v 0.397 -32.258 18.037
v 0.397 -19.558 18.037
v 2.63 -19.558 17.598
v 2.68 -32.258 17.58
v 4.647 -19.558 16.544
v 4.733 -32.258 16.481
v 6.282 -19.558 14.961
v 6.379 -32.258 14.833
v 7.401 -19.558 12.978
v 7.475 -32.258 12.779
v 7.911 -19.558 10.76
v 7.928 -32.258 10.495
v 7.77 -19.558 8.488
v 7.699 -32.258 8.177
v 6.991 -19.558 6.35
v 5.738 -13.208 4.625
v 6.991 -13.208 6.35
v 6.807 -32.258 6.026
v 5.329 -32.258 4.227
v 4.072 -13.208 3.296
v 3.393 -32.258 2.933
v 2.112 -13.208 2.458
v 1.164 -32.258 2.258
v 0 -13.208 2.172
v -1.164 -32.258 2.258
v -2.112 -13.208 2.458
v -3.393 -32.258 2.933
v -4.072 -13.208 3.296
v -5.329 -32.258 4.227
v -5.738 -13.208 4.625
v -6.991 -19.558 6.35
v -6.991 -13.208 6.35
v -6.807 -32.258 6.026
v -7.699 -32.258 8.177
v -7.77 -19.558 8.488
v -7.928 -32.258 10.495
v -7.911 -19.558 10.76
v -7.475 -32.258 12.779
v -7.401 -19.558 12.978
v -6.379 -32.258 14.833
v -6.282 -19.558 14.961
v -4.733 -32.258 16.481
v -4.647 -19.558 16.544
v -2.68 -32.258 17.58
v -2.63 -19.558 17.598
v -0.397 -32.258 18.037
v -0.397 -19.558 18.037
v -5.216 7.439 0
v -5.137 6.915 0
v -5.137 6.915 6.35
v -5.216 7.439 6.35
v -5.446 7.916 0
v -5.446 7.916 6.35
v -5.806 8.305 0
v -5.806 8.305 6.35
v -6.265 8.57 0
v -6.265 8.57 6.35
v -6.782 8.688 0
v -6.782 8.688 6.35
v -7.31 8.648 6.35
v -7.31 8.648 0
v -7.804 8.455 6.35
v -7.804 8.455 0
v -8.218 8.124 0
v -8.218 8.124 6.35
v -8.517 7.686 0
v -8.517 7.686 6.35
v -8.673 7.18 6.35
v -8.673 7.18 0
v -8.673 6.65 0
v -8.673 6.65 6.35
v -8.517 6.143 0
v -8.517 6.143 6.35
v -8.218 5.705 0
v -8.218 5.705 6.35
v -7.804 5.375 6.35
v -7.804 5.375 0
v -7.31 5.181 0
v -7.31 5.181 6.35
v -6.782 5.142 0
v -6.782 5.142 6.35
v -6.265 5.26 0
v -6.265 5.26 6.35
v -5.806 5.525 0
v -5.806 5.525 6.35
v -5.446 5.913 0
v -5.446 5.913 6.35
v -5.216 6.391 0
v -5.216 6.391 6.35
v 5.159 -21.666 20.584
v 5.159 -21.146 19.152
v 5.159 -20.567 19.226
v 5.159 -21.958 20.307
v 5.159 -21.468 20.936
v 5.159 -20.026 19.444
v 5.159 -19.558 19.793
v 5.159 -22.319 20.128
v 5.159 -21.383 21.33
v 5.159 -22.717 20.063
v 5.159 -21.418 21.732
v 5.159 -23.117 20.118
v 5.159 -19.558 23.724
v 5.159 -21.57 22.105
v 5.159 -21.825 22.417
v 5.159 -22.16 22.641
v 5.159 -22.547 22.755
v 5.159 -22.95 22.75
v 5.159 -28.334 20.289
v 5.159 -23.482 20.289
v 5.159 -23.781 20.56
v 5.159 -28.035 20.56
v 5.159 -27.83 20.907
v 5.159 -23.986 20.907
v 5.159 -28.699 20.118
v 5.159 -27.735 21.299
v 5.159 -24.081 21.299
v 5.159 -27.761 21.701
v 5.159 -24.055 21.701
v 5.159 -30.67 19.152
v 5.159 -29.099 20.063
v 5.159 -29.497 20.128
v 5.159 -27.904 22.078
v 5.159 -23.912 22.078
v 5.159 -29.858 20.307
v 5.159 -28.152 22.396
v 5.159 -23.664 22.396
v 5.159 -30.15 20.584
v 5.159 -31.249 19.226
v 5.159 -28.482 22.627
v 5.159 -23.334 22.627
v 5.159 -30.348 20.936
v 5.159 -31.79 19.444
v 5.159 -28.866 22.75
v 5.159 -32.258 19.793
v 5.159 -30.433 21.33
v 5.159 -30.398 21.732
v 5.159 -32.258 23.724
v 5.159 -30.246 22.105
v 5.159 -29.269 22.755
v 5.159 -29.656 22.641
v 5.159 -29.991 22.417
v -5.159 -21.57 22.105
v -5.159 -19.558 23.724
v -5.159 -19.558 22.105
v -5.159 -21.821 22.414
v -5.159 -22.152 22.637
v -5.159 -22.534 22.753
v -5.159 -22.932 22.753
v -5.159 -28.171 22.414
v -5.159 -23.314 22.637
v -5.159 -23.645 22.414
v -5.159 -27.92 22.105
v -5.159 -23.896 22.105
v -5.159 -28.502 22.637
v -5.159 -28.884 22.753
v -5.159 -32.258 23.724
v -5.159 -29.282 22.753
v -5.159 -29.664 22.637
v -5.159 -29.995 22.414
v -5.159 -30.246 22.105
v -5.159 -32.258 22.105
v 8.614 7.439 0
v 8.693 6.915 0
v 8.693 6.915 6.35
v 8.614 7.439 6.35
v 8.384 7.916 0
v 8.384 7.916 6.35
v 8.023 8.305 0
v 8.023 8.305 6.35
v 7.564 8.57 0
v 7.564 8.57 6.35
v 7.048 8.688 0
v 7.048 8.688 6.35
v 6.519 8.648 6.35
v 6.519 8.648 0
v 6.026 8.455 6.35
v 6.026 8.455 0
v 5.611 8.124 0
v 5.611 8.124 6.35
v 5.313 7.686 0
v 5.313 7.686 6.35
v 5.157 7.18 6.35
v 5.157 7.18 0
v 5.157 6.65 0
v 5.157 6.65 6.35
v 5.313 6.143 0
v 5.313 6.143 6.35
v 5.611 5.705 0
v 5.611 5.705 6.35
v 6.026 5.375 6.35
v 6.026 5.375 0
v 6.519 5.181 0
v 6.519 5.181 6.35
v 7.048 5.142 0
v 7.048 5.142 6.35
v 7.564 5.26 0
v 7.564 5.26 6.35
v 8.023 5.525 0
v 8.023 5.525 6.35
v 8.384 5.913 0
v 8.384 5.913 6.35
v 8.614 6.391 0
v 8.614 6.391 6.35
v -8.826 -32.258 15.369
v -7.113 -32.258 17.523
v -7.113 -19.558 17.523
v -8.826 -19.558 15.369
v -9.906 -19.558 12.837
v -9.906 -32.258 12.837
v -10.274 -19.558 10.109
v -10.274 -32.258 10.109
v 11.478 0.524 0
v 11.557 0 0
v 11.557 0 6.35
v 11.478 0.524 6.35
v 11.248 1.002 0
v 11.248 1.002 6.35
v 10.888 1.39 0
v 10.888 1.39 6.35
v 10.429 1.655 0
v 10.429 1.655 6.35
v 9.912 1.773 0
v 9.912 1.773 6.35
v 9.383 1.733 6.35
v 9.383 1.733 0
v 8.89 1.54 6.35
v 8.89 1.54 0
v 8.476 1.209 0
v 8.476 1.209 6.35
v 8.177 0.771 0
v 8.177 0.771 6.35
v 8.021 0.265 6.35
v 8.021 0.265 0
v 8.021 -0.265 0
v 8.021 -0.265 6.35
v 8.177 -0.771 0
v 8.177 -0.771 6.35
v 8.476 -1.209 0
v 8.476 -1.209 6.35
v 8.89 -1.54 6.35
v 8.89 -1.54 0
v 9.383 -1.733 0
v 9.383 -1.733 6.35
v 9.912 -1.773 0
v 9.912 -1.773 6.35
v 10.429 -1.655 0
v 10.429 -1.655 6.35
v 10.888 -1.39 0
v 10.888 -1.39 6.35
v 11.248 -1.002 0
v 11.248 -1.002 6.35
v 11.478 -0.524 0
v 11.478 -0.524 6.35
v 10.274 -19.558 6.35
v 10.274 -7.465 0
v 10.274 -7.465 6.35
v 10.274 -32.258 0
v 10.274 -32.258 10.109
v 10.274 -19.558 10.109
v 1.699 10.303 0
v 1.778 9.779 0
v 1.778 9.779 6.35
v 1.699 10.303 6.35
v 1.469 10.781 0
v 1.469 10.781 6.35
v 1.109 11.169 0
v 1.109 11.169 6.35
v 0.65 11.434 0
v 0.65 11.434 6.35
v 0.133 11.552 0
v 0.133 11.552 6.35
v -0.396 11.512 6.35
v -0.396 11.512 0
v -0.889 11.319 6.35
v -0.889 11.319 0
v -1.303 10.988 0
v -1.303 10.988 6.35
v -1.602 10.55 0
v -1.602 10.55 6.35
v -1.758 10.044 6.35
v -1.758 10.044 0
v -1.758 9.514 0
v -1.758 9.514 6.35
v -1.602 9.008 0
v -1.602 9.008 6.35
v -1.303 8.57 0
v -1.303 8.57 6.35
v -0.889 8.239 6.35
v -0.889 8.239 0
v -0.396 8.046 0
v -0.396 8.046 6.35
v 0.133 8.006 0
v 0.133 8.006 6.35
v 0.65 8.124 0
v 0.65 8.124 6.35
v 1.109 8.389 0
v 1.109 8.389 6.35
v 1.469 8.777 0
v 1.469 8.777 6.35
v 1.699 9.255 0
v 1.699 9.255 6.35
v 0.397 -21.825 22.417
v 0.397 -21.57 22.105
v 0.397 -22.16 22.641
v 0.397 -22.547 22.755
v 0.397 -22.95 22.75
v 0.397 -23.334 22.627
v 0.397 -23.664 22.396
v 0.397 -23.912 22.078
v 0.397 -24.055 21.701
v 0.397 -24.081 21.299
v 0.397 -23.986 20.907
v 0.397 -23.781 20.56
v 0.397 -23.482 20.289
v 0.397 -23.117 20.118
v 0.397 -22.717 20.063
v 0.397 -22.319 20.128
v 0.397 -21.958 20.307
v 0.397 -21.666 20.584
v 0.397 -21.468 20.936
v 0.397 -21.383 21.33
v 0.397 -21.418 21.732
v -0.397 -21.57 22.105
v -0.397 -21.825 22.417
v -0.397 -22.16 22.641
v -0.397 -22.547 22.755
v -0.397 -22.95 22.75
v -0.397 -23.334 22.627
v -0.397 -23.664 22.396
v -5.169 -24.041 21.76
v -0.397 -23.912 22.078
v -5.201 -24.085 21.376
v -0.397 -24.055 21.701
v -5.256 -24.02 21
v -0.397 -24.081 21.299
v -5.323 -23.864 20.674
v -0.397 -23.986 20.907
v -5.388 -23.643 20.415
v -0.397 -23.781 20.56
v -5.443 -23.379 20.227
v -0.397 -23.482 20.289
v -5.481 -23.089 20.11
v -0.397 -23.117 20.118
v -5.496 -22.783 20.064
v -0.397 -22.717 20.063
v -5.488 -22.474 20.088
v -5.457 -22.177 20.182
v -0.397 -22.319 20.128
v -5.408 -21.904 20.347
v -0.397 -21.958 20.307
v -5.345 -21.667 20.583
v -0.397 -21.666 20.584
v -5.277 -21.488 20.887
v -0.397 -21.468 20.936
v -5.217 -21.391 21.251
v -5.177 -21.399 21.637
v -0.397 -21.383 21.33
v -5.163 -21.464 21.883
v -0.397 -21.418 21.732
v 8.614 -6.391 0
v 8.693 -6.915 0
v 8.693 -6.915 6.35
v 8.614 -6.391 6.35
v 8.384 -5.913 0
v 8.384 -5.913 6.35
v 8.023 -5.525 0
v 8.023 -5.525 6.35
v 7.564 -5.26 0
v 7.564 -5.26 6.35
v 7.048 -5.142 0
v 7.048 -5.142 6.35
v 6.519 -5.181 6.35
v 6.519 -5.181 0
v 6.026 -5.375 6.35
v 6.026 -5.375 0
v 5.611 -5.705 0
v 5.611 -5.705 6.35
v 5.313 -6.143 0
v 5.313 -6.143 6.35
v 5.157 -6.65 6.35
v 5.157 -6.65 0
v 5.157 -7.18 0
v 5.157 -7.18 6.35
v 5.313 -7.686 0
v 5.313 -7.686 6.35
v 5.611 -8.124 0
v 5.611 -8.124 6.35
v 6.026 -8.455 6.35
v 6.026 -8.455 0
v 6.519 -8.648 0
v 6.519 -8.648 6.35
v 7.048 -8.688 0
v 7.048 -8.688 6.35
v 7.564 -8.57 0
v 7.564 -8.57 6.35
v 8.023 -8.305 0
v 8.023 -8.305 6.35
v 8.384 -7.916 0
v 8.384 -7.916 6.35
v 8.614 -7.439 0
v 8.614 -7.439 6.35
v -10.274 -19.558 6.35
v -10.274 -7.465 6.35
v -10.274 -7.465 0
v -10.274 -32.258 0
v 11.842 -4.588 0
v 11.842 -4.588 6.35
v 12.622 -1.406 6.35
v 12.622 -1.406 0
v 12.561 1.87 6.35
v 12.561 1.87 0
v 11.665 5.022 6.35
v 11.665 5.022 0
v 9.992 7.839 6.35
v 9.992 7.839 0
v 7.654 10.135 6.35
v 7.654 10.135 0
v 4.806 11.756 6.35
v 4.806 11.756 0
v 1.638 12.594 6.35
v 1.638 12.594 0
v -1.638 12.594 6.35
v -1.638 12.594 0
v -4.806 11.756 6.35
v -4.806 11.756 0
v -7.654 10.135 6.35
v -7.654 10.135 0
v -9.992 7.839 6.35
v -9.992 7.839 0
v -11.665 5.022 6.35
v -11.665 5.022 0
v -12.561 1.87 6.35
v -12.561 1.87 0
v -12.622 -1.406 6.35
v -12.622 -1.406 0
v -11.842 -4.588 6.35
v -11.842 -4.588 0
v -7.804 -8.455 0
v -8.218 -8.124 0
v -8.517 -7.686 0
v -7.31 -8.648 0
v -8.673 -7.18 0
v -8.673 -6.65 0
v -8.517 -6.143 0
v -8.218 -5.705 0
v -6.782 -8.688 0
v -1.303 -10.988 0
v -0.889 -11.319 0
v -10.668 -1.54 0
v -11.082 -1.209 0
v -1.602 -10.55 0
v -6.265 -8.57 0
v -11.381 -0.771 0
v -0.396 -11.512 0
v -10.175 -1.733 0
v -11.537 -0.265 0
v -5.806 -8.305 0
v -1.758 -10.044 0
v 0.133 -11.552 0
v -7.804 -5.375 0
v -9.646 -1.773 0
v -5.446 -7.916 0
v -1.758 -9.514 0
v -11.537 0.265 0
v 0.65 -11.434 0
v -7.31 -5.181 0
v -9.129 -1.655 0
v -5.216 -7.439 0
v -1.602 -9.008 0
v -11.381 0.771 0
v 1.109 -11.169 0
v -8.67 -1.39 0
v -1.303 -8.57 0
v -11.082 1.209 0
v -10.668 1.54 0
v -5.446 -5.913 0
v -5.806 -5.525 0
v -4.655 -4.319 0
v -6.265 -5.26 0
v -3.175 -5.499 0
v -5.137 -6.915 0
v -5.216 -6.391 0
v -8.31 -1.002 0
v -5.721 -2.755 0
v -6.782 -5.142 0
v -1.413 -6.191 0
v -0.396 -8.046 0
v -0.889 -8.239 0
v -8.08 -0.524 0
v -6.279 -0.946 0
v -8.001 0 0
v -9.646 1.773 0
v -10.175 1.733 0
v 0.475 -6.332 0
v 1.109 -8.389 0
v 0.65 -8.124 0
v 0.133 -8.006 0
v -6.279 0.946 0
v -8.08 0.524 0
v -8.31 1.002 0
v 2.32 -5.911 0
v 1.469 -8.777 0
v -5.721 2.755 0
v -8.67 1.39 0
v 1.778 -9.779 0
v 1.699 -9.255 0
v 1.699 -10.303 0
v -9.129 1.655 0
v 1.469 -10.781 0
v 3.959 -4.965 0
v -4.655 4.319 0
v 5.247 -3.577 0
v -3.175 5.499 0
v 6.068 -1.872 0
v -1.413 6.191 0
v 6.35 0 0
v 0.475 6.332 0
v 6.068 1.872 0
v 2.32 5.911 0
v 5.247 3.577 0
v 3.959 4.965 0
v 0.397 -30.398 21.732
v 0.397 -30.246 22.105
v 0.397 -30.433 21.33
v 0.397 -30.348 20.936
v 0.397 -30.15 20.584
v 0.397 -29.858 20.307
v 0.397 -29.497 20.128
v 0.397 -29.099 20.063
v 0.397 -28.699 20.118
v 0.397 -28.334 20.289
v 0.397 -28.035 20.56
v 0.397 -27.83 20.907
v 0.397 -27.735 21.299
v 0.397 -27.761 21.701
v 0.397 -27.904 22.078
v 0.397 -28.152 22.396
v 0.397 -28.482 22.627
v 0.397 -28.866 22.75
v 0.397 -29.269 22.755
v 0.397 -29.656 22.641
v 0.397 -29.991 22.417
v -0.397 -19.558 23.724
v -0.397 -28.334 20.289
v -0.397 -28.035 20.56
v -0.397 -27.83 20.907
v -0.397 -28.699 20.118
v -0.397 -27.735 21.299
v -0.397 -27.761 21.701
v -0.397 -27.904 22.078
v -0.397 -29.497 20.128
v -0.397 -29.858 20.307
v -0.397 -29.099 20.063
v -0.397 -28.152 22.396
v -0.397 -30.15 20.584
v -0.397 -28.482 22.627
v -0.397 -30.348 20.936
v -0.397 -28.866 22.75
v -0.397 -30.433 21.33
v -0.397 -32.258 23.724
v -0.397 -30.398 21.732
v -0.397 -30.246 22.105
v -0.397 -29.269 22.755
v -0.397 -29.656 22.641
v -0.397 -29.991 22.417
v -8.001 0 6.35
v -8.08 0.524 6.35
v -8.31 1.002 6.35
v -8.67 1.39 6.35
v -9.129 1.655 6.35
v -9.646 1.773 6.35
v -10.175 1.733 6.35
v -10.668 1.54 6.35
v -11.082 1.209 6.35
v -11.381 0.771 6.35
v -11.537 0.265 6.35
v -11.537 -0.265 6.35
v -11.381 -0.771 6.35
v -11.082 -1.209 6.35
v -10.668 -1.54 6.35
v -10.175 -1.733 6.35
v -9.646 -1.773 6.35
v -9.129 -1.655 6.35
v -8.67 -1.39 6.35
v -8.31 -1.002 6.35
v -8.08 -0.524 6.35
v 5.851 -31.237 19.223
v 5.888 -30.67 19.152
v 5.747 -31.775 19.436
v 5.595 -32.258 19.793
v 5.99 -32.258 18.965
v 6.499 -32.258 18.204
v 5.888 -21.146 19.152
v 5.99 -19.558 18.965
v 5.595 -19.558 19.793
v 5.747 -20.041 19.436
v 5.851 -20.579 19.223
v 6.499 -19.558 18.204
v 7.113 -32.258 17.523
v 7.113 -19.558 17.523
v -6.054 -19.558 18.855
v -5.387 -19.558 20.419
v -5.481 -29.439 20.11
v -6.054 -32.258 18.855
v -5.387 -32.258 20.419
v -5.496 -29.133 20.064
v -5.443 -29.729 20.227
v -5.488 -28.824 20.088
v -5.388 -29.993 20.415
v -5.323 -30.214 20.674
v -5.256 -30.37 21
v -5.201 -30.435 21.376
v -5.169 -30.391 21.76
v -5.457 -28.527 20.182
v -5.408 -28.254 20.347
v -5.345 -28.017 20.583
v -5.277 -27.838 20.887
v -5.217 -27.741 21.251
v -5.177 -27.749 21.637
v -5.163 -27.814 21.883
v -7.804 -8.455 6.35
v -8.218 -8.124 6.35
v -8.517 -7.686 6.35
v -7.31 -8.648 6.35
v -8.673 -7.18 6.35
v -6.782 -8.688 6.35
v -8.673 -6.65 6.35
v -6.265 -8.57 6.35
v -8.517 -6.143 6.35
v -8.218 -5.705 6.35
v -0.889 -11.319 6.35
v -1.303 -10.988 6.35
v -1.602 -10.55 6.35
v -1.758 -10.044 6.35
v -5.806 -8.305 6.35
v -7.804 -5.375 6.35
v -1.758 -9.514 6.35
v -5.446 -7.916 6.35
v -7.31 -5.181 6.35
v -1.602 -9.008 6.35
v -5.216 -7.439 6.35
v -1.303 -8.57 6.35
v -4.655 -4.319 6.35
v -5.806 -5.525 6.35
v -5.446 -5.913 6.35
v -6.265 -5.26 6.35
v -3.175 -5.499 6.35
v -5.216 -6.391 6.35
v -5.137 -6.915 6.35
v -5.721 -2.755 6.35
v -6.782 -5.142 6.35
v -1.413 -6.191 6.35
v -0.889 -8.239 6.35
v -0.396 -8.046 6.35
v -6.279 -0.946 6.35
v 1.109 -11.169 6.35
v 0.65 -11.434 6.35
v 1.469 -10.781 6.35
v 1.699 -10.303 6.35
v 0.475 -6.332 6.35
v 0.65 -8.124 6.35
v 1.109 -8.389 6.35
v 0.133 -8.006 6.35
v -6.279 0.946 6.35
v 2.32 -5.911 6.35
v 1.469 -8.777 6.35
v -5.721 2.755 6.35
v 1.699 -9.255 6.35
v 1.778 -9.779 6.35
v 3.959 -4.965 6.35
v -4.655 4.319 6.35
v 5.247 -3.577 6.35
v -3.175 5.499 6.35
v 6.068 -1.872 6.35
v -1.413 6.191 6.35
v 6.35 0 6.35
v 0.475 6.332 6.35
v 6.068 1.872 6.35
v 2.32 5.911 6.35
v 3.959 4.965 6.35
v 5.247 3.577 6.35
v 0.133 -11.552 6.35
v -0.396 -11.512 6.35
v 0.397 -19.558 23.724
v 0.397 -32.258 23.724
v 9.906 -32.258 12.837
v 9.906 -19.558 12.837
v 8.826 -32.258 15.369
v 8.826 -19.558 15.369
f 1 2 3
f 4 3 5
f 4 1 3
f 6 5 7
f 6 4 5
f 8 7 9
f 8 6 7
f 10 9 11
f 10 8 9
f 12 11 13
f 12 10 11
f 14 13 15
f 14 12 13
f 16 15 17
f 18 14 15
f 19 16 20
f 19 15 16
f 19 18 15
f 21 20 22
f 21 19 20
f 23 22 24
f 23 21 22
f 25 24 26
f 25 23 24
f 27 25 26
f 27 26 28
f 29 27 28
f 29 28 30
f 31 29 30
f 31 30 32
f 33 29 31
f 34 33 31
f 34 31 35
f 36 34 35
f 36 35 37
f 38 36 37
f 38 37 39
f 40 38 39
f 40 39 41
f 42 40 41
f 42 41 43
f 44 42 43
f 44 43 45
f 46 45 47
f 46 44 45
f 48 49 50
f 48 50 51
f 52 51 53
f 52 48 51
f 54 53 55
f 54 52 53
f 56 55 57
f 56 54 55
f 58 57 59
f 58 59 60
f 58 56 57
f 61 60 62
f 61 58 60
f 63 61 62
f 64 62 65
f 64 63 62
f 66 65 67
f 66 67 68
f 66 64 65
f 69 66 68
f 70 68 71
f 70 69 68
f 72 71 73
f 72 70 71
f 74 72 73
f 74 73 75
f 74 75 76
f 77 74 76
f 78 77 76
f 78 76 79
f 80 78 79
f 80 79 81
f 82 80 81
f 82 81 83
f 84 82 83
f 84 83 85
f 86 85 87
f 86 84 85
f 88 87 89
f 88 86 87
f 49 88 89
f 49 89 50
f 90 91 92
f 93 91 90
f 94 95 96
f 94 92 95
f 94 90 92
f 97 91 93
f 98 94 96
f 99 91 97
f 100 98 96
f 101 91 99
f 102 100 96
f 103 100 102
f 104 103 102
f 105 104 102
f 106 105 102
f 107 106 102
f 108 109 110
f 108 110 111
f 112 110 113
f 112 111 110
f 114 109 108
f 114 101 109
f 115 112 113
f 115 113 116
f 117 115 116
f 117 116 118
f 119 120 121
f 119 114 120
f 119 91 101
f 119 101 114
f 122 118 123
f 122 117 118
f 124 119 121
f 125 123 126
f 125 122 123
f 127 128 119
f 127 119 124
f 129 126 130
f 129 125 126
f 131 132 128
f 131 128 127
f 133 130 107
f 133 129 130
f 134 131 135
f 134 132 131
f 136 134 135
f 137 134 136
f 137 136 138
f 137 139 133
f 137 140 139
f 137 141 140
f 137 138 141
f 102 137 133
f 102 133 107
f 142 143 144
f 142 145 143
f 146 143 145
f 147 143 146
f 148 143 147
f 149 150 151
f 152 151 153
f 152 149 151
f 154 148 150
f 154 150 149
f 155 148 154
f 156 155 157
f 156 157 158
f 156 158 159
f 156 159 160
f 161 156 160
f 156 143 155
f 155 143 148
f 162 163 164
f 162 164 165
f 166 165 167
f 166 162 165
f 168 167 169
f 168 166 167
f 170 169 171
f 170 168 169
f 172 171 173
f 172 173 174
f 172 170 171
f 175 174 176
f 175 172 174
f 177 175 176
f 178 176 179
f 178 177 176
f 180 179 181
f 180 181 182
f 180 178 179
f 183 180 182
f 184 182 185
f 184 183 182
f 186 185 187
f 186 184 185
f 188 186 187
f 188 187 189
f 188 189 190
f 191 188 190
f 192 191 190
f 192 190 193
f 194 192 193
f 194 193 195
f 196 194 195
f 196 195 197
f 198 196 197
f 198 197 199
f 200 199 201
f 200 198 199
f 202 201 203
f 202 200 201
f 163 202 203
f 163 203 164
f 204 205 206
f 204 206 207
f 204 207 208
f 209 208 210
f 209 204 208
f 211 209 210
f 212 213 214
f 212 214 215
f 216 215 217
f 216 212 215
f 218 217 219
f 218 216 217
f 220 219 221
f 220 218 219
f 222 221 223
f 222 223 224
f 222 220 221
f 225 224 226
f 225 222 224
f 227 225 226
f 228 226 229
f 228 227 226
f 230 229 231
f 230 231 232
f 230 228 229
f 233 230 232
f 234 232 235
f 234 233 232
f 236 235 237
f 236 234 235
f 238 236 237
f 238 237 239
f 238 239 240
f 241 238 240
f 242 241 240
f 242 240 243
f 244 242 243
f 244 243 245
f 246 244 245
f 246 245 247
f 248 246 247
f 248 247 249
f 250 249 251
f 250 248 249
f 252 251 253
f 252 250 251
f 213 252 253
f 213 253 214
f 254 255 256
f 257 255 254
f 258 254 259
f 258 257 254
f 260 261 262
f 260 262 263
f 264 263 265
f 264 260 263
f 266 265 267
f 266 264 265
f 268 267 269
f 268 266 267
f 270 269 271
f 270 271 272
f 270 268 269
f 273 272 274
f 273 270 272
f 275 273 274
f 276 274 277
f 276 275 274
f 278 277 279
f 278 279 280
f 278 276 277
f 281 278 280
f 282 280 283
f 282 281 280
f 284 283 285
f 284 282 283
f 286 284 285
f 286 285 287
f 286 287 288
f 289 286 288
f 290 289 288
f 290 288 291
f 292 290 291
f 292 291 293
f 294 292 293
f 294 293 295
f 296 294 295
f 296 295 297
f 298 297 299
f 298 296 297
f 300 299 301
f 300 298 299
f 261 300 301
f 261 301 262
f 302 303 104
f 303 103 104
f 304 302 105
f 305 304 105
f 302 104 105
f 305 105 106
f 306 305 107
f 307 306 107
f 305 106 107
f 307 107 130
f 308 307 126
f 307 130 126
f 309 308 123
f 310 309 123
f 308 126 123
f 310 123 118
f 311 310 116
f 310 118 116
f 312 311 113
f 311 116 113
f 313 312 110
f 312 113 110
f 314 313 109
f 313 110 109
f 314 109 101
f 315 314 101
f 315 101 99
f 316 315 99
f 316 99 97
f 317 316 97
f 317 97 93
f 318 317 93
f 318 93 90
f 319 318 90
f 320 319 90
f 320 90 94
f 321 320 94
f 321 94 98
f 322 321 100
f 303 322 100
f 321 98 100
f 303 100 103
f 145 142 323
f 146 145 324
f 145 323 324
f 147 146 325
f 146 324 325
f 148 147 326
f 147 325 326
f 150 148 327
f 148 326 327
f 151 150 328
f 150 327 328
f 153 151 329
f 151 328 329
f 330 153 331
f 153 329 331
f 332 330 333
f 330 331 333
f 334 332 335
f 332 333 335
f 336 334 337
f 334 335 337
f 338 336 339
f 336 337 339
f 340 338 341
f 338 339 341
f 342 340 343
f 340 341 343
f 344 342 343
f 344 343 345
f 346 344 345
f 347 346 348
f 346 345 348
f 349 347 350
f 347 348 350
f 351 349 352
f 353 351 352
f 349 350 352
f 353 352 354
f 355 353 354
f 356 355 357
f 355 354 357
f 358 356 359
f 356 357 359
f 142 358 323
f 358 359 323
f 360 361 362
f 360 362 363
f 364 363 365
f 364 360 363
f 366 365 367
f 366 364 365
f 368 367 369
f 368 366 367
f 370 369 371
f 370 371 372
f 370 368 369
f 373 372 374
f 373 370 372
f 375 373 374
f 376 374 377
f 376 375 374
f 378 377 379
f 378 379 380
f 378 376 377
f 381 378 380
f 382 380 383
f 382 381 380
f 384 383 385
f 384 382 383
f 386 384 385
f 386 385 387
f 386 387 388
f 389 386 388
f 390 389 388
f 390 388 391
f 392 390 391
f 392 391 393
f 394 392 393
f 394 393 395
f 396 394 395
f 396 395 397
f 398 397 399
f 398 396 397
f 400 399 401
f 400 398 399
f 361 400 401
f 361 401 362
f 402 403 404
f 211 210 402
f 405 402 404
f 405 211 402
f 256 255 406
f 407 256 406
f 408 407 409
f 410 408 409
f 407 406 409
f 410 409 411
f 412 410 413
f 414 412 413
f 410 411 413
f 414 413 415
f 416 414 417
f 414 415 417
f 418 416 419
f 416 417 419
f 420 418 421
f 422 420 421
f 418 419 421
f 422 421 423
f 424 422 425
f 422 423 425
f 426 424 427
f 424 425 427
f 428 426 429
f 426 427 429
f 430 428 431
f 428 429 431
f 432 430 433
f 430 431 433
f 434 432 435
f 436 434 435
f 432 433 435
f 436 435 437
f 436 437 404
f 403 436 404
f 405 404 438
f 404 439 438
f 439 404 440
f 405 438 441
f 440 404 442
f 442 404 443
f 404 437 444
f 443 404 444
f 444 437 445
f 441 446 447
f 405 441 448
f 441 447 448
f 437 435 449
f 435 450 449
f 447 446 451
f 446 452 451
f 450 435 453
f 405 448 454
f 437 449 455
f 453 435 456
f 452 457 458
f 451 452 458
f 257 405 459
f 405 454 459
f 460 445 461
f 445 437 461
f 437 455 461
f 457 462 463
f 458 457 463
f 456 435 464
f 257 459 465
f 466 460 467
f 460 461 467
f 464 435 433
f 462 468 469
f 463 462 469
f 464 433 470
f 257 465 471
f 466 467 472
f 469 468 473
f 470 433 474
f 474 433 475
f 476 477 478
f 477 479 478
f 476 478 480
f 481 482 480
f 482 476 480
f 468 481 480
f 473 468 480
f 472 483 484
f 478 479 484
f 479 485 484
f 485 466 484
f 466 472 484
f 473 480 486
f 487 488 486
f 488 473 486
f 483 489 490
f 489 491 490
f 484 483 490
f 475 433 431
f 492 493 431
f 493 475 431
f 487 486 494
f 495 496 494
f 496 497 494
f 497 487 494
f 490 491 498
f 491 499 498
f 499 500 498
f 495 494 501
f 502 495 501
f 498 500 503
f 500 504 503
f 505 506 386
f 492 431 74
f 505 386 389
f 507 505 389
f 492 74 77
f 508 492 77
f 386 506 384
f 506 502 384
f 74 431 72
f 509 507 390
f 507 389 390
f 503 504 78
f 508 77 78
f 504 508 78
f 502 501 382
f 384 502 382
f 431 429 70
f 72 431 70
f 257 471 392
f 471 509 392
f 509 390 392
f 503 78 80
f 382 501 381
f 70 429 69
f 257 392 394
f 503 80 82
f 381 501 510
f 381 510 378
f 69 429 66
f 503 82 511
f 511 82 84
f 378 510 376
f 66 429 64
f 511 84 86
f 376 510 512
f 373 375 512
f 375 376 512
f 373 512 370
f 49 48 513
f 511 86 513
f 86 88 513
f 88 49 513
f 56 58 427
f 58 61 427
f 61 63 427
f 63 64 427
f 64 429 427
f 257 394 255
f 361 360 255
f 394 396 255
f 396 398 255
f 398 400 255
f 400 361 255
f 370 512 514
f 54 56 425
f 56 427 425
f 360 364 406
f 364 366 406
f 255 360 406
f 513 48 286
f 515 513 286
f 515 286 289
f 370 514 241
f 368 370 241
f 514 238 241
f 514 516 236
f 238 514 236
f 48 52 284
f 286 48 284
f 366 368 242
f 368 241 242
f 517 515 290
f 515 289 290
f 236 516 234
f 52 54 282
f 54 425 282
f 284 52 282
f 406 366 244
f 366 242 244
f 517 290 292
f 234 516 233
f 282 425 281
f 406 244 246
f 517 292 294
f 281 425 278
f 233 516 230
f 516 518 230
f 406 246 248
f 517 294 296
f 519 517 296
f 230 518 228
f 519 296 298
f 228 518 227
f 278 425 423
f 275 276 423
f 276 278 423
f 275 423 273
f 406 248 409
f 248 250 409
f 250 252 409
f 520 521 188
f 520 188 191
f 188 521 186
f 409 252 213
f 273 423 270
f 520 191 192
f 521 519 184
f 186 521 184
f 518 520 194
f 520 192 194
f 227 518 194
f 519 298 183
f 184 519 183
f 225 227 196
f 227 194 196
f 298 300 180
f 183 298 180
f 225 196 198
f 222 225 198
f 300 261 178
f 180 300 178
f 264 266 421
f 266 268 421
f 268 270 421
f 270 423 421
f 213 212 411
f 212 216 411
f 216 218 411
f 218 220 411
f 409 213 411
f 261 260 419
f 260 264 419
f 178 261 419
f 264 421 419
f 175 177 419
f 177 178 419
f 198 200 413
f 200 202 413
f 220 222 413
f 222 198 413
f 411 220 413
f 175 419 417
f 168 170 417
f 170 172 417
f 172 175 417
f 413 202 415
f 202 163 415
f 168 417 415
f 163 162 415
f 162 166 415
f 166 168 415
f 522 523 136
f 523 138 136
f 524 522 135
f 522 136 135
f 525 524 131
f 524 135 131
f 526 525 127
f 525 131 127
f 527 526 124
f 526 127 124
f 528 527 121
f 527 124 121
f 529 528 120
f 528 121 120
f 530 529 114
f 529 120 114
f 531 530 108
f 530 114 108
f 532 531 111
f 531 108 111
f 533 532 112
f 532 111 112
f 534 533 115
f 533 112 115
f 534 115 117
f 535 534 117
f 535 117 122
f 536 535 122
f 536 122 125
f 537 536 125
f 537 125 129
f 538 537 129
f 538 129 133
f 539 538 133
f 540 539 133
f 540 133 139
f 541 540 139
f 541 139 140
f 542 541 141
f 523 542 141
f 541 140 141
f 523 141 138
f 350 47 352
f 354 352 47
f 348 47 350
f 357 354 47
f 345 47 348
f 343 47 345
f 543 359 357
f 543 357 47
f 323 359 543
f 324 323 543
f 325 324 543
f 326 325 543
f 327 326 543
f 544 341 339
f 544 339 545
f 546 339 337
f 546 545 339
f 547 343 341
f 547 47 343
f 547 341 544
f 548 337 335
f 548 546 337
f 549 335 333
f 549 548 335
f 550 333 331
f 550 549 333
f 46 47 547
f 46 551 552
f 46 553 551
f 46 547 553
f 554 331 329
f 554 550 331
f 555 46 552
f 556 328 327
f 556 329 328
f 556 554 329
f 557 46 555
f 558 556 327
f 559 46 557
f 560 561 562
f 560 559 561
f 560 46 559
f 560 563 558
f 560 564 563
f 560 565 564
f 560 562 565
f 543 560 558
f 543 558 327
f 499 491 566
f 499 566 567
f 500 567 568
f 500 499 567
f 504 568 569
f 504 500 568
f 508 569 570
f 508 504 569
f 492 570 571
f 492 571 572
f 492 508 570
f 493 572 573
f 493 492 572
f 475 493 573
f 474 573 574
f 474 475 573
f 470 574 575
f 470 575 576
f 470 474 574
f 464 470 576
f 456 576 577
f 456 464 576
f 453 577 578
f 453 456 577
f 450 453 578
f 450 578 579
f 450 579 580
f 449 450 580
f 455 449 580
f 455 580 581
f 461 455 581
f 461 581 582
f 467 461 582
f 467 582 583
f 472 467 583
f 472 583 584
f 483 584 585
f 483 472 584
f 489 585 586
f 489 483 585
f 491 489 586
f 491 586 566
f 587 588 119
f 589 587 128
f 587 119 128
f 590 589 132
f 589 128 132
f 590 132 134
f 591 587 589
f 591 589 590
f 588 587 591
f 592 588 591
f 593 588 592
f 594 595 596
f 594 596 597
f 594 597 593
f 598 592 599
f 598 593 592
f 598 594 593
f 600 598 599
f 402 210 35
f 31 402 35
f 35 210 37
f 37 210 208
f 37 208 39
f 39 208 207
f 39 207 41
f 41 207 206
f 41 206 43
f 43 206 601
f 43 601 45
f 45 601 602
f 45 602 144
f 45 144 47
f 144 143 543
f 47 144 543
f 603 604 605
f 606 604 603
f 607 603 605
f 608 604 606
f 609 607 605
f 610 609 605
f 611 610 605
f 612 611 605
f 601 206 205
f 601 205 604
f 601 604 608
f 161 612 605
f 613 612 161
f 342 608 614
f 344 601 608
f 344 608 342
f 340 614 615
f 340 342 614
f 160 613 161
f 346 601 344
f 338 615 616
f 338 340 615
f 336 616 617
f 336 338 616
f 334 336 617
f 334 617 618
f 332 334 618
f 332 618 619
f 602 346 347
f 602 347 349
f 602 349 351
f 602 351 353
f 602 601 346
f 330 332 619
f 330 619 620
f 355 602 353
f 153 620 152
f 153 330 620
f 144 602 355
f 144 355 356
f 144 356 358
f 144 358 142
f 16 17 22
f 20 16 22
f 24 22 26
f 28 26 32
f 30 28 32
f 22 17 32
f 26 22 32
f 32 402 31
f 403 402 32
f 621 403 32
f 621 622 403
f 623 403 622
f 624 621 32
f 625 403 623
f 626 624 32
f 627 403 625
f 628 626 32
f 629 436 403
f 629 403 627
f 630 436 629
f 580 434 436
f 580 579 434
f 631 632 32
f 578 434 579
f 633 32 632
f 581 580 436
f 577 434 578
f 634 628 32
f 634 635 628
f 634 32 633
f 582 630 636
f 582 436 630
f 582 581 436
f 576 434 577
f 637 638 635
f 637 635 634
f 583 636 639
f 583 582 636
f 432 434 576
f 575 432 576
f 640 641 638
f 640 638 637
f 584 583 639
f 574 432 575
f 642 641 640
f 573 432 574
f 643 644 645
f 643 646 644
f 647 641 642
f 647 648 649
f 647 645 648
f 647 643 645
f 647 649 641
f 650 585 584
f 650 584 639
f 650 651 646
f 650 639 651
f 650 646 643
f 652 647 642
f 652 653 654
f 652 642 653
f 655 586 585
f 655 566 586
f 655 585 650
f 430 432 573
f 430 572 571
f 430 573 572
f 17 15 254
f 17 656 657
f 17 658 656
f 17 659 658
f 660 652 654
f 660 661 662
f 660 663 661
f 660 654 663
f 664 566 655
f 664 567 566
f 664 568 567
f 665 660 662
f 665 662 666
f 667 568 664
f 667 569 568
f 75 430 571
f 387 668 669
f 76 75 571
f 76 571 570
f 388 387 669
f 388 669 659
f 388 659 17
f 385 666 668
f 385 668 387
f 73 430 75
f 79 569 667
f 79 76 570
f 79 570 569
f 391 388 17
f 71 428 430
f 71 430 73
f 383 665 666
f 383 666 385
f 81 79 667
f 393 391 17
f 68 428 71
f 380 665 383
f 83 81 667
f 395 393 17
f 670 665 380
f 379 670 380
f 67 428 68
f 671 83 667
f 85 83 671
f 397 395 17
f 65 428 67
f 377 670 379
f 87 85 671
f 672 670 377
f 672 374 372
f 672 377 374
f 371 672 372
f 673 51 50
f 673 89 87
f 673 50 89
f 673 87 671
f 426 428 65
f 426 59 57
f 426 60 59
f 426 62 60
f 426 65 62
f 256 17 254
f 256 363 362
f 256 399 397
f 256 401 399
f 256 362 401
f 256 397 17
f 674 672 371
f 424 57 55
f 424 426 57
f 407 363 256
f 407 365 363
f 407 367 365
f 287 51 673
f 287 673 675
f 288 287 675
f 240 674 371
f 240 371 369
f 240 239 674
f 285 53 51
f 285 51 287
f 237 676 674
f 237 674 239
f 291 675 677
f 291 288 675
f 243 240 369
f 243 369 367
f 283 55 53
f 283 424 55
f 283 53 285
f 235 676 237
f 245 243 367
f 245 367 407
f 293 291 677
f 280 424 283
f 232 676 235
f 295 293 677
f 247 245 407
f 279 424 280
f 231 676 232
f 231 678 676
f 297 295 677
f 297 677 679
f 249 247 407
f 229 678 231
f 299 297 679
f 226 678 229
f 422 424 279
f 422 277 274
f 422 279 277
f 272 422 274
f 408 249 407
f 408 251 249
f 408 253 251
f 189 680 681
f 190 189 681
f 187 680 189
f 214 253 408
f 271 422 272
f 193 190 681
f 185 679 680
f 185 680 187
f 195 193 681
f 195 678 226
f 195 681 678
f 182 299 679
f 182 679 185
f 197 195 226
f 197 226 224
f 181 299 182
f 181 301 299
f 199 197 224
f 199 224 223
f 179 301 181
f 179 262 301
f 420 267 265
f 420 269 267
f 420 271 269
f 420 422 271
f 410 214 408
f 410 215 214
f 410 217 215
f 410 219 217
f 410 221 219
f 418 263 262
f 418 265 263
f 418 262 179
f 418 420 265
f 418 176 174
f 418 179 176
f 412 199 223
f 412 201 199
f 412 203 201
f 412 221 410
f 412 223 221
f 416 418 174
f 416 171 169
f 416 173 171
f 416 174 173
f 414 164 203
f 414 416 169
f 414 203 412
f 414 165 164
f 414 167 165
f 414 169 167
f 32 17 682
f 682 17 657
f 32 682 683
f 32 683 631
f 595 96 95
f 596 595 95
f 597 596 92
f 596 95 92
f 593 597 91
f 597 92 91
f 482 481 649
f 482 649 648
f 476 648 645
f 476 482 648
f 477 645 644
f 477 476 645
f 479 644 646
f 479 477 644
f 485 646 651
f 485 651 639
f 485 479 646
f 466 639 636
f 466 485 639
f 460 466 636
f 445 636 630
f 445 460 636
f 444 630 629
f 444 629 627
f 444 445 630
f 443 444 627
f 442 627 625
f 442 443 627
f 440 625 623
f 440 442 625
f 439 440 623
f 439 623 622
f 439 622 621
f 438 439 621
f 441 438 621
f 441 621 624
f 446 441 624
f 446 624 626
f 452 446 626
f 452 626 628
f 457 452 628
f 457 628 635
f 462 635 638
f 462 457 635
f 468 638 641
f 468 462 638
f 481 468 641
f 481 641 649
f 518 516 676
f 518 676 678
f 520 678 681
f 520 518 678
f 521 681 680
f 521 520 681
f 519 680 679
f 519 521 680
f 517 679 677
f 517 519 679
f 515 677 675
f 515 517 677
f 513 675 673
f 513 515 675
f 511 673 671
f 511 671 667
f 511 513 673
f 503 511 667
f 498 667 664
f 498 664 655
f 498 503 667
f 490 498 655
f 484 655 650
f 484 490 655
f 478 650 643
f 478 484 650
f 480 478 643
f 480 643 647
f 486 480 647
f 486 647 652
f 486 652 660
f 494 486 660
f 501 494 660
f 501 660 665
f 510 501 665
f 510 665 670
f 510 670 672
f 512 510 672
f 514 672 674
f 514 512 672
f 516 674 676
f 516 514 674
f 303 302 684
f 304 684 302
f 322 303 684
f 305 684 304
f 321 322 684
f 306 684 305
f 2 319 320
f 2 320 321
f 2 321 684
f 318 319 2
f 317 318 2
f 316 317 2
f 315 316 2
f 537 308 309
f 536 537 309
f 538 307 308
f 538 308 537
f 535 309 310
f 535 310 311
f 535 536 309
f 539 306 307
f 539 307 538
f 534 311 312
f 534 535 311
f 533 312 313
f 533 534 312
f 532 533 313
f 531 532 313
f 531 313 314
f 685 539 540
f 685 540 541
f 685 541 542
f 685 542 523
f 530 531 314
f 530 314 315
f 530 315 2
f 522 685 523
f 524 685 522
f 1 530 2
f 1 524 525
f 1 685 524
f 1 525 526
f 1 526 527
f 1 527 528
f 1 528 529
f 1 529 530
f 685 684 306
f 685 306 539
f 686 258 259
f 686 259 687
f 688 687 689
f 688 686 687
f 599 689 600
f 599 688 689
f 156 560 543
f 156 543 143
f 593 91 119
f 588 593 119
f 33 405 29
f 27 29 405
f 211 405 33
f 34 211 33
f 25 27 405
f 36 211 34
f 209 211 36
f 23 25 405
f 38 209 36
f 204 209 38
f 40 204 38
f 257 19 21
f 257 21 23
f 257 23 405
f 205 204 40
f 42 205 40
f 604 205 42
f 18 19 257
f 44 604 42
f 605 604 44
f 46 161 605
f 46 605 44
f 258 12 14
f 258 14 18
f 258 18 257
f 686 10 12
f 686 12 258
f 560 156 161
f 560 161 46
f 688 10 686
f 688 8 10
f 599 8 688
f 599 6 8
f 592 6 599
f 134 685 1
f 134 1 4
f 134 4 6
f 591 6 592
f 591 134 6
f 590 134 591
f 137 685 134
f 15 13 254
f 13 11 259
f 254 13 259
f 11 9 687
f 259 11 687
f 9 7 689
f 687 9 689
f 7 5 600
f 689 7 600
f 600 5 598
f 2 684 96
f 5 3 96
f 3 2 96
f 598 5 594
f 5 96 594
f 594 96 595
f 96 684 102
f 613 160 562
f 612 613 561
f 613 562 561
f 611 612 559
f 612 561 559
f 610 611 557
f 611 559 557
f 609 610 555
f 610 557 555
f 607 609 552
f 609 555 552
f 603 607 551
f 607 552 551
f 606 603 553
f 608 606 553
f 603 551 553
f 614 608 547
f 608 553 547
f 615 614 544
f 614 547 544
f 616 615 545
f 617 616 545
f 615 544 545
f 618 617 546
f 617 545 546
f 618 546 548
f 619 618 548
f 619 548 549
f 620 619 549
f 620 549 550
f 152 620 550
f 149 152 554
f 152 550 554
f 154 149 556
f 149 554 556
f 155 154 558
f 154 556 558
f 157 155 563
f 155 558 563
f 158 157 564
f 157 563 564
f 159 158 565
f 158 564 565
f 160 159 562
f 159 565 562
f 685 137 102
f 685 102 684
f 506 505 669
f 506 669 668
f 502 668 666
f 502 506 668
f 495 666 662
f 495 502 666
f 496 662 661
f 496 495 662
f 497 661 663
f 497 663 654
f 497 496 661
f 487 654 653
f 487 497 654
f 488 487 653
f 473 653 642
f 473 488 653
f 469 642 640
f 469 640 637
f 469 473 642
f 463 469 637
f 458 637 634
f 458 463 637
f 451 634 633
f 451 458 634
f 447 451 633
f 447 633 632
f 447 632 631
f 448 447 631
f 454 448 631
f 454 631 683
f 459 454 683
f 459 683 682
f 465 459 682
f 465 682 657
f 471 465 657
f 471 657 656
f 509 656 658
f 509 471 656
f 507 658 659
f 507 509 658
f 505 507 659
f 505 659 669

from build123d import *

# Parameters (mm, degrees)
ESQUISSE1_R                  = 6.35
ESQUISSE1_R_2                = 1.778
BOSS_EXTRU_1_DEPTH           = 6.35
BOSS_EXTRU_2_DEPTH           = 12.7
ENL_V_MAT_EXTRU_1_DEPTH      = 19.05
CONG_1_R                     = 6.35
ENL_V_MAT_EXTRU_2_REACH      = 45.845
ENL_V_MAT_EXTRU_2_END_RADIUS = 6.35
ESQUISSE5_R                  = 1.35255
ENL_V_MAT_EXTRU_3_DEPTH      = 44.844555452


with BuildPart() as part:
    # Esquisse1 → Boss.-Extru.1 (new body)
    with BuildSketch(Plane.XY):
        with BuildLine():
            Line((-10.2743, -7.465169758), (-10.2743, -32.258))
            Line((-10.2743, -32.258), (10.2743, -32.258))
            Line((10.2743, -32.258), (10.2743, -7.465169758))
            ThreePointArc((10.2743, -7.465169758), (0, 12.7), (-10.2743, -7.465169758))
        make_face()
        Circle(ESQUISSE1_R, mode=Mode.SUBTRACT)
        with Locations((0, 9.779)):
            Circle(ESQUISSE1_R_2, mode=Mode.SUBTRACT)
        with Locations((6.914797213, 6.914797213)):
            Circle(ESQUISSE1_R_2, mode=Mode.SUBTRACT)
        with Locations((9.779, 0)):
            Circle(ESQUISSE1_R_2, mode=Mode.SUBTRACT)
        with Locations((6.914797213, -6.914797213)):
            Circle(ESQUISSE1_R_2, mode=Mode.SUBTRACT)
        with Locations((0, -9.779)):
            Circle(ESQUISSE1_R_2, mode=Mode.SUBTRACT)
        with Locations((-6.914797213, -6.914797213)):
            Circle(ESQUISSE1_R_2, mode=Mode.SUBTRACT)
        with Locations((-9.779, 0)):
            Circle(ESQUISSE1_R_2, mode=Mode.SUBTRACT)
        with Locations((-6.914797213, 6.914797213)):
            Circle(ESQUISSE1_R_2, mode=Mode.SUBTRACT)
    extrude(amount=BOSS_EXTRU_1_DEPTH)

    # Esquisse2 → Boss.-Extru.2 (add)
    with BuildSketch(Plane.XZ.offset(32.258)):
        with BuildLine():
            Line((-10.2743, 10.1092), (-10.2743, 6.35))
            Line((-10.2743, 6.35), (10.2743, 6.35))
            Line((10.2743, 6.35), (10.2743, 10.1092))
            ThreePointArc((10.2743, 10.1092), (8.9042183, 15.235225455), (5.159375, 18.994136134))
            Line((5.159375, 18.994136134), (5.159375, 23.7236))
            Line((5.159375, 23.7236), (-5.159375, 23.7236))
            Line((-5.159375, 23.7236), (-5.159375, 18.994136134))
            ThreePointArc((-5.159375, 18.994136134), (-8.9042183, 15.235225455), (-10.2743, 10.1092))
        make_face()
    extrude(amount=-BOSS_EXTRU_2_DEPTH)

    # Esquisse3 → Enlèv. mat.-Extru.1 (cut)
    with BuildSketch(Plane.XZ.offset(32.258)):
        with BuildLine():
            Line((-0.396875, 18.036771916), (-0.396875, 23.7236))
            Line((-0.396875, 23.7236), (0.396875, 23.7236))
            Line((0.396875, 23.7236), (0.396875, 18.036771916))
            ThreePointArc((0.396875, 18.036771916), (0, 2.1717), (-0.396875, 18.036771916))
        make_face()
    extrude(amount=-ENL_V_MAT_EXTRU_1_DEPTH, mode=Mode.SUBTRACT)

    # Congé1
    cong_1_edges = [part.edges().sort_by_distance(p)[0] for p in [
        (-5.159375, -25.908, 18.994136134),
        (5.159375, -25.908, 18.994136134),
    ]]
    fillet(cong_1_edges, radius=CONG_1_R)

    # Enlèv. mat.-Extru.2: up to this cylinder (the profile starts outside it)
    enl_v_mat_extru_2_end = Plane(origin=(11.509375, -25.908, 22.105100867), z_dir=(0, -1, 0)) * Cylinder(ENL_V_MAT_EXTRU_2_END_RADIUS, 105.39, mode=Mode.PRIVATE)
    # Esquisse4 → Enlèv. mat.-Extru.2 (cut, up to the surface)
    with BuildSketch(Plane(origin=(5.159375, 0, 0), x_dir=(0, 0, -1), z_dir=(1, 0, 0)), mode=Mode.PRIVATE) as enl_v_mat_extru_2_sk1:
        with BuildLine():
            Line((-19.1516, -21.1455), (-19.1516, -30.6705))
            ThreePointArc((-19.1516, -30.6705), (-21.4376, -32.9565), (-23.7236, -30.6705))
            Line((-23.7236, -30.6705), (-23.7236, -21.1455))
            ThreePointArc((-23.7236, -21.1455), (-21.4376, -18.8595), (-19.1516, -21.1455))
        make_face()
    enl_v_mat_extru_2_tool1 = extrude(enl_v_mat_extru_2_sk1.sketch, amount=ENL_V_MAT_EXTRU_2_REACH, mode=Mode.PRIVATE) - enl_v_mat_extru_2_end
    add(enl_v_mat_extru_2_tool1.solids().sort_by_distance((5.159375, -25.908, 21.4376))[0], mode=Mode.SUBTRACT)
    add(enl_v_mat_extru_2_tool1.solids().sort_by_distance((5.159375, -25.908, 21.4376))[1], mode=Mode.SUBTRACT)

    # Esquisse5 → Enlèv. mat.-Extru.3 (cut, through all)
    with BuildSketch(Plane(origin=(5.159375, 0, 0), x_dir=(0, 0, -1), z_dir=(1, 0, 0))):
        with Locations(Location((-21.415375, -22.733, 0), (0, 0, 120.660154312))):
            Circle(ESQUISSE5_R)
        with Locations(Location((-21.415375, -29.083, 0), (0, 0, 239.339845688))):
            Circle(ESQUISSE5_R)
    extrude(amount=-ENL_V_MAT_EXTRU_3_DEPTH, mode=Mode.SUBTRACT)


solid = part.part
